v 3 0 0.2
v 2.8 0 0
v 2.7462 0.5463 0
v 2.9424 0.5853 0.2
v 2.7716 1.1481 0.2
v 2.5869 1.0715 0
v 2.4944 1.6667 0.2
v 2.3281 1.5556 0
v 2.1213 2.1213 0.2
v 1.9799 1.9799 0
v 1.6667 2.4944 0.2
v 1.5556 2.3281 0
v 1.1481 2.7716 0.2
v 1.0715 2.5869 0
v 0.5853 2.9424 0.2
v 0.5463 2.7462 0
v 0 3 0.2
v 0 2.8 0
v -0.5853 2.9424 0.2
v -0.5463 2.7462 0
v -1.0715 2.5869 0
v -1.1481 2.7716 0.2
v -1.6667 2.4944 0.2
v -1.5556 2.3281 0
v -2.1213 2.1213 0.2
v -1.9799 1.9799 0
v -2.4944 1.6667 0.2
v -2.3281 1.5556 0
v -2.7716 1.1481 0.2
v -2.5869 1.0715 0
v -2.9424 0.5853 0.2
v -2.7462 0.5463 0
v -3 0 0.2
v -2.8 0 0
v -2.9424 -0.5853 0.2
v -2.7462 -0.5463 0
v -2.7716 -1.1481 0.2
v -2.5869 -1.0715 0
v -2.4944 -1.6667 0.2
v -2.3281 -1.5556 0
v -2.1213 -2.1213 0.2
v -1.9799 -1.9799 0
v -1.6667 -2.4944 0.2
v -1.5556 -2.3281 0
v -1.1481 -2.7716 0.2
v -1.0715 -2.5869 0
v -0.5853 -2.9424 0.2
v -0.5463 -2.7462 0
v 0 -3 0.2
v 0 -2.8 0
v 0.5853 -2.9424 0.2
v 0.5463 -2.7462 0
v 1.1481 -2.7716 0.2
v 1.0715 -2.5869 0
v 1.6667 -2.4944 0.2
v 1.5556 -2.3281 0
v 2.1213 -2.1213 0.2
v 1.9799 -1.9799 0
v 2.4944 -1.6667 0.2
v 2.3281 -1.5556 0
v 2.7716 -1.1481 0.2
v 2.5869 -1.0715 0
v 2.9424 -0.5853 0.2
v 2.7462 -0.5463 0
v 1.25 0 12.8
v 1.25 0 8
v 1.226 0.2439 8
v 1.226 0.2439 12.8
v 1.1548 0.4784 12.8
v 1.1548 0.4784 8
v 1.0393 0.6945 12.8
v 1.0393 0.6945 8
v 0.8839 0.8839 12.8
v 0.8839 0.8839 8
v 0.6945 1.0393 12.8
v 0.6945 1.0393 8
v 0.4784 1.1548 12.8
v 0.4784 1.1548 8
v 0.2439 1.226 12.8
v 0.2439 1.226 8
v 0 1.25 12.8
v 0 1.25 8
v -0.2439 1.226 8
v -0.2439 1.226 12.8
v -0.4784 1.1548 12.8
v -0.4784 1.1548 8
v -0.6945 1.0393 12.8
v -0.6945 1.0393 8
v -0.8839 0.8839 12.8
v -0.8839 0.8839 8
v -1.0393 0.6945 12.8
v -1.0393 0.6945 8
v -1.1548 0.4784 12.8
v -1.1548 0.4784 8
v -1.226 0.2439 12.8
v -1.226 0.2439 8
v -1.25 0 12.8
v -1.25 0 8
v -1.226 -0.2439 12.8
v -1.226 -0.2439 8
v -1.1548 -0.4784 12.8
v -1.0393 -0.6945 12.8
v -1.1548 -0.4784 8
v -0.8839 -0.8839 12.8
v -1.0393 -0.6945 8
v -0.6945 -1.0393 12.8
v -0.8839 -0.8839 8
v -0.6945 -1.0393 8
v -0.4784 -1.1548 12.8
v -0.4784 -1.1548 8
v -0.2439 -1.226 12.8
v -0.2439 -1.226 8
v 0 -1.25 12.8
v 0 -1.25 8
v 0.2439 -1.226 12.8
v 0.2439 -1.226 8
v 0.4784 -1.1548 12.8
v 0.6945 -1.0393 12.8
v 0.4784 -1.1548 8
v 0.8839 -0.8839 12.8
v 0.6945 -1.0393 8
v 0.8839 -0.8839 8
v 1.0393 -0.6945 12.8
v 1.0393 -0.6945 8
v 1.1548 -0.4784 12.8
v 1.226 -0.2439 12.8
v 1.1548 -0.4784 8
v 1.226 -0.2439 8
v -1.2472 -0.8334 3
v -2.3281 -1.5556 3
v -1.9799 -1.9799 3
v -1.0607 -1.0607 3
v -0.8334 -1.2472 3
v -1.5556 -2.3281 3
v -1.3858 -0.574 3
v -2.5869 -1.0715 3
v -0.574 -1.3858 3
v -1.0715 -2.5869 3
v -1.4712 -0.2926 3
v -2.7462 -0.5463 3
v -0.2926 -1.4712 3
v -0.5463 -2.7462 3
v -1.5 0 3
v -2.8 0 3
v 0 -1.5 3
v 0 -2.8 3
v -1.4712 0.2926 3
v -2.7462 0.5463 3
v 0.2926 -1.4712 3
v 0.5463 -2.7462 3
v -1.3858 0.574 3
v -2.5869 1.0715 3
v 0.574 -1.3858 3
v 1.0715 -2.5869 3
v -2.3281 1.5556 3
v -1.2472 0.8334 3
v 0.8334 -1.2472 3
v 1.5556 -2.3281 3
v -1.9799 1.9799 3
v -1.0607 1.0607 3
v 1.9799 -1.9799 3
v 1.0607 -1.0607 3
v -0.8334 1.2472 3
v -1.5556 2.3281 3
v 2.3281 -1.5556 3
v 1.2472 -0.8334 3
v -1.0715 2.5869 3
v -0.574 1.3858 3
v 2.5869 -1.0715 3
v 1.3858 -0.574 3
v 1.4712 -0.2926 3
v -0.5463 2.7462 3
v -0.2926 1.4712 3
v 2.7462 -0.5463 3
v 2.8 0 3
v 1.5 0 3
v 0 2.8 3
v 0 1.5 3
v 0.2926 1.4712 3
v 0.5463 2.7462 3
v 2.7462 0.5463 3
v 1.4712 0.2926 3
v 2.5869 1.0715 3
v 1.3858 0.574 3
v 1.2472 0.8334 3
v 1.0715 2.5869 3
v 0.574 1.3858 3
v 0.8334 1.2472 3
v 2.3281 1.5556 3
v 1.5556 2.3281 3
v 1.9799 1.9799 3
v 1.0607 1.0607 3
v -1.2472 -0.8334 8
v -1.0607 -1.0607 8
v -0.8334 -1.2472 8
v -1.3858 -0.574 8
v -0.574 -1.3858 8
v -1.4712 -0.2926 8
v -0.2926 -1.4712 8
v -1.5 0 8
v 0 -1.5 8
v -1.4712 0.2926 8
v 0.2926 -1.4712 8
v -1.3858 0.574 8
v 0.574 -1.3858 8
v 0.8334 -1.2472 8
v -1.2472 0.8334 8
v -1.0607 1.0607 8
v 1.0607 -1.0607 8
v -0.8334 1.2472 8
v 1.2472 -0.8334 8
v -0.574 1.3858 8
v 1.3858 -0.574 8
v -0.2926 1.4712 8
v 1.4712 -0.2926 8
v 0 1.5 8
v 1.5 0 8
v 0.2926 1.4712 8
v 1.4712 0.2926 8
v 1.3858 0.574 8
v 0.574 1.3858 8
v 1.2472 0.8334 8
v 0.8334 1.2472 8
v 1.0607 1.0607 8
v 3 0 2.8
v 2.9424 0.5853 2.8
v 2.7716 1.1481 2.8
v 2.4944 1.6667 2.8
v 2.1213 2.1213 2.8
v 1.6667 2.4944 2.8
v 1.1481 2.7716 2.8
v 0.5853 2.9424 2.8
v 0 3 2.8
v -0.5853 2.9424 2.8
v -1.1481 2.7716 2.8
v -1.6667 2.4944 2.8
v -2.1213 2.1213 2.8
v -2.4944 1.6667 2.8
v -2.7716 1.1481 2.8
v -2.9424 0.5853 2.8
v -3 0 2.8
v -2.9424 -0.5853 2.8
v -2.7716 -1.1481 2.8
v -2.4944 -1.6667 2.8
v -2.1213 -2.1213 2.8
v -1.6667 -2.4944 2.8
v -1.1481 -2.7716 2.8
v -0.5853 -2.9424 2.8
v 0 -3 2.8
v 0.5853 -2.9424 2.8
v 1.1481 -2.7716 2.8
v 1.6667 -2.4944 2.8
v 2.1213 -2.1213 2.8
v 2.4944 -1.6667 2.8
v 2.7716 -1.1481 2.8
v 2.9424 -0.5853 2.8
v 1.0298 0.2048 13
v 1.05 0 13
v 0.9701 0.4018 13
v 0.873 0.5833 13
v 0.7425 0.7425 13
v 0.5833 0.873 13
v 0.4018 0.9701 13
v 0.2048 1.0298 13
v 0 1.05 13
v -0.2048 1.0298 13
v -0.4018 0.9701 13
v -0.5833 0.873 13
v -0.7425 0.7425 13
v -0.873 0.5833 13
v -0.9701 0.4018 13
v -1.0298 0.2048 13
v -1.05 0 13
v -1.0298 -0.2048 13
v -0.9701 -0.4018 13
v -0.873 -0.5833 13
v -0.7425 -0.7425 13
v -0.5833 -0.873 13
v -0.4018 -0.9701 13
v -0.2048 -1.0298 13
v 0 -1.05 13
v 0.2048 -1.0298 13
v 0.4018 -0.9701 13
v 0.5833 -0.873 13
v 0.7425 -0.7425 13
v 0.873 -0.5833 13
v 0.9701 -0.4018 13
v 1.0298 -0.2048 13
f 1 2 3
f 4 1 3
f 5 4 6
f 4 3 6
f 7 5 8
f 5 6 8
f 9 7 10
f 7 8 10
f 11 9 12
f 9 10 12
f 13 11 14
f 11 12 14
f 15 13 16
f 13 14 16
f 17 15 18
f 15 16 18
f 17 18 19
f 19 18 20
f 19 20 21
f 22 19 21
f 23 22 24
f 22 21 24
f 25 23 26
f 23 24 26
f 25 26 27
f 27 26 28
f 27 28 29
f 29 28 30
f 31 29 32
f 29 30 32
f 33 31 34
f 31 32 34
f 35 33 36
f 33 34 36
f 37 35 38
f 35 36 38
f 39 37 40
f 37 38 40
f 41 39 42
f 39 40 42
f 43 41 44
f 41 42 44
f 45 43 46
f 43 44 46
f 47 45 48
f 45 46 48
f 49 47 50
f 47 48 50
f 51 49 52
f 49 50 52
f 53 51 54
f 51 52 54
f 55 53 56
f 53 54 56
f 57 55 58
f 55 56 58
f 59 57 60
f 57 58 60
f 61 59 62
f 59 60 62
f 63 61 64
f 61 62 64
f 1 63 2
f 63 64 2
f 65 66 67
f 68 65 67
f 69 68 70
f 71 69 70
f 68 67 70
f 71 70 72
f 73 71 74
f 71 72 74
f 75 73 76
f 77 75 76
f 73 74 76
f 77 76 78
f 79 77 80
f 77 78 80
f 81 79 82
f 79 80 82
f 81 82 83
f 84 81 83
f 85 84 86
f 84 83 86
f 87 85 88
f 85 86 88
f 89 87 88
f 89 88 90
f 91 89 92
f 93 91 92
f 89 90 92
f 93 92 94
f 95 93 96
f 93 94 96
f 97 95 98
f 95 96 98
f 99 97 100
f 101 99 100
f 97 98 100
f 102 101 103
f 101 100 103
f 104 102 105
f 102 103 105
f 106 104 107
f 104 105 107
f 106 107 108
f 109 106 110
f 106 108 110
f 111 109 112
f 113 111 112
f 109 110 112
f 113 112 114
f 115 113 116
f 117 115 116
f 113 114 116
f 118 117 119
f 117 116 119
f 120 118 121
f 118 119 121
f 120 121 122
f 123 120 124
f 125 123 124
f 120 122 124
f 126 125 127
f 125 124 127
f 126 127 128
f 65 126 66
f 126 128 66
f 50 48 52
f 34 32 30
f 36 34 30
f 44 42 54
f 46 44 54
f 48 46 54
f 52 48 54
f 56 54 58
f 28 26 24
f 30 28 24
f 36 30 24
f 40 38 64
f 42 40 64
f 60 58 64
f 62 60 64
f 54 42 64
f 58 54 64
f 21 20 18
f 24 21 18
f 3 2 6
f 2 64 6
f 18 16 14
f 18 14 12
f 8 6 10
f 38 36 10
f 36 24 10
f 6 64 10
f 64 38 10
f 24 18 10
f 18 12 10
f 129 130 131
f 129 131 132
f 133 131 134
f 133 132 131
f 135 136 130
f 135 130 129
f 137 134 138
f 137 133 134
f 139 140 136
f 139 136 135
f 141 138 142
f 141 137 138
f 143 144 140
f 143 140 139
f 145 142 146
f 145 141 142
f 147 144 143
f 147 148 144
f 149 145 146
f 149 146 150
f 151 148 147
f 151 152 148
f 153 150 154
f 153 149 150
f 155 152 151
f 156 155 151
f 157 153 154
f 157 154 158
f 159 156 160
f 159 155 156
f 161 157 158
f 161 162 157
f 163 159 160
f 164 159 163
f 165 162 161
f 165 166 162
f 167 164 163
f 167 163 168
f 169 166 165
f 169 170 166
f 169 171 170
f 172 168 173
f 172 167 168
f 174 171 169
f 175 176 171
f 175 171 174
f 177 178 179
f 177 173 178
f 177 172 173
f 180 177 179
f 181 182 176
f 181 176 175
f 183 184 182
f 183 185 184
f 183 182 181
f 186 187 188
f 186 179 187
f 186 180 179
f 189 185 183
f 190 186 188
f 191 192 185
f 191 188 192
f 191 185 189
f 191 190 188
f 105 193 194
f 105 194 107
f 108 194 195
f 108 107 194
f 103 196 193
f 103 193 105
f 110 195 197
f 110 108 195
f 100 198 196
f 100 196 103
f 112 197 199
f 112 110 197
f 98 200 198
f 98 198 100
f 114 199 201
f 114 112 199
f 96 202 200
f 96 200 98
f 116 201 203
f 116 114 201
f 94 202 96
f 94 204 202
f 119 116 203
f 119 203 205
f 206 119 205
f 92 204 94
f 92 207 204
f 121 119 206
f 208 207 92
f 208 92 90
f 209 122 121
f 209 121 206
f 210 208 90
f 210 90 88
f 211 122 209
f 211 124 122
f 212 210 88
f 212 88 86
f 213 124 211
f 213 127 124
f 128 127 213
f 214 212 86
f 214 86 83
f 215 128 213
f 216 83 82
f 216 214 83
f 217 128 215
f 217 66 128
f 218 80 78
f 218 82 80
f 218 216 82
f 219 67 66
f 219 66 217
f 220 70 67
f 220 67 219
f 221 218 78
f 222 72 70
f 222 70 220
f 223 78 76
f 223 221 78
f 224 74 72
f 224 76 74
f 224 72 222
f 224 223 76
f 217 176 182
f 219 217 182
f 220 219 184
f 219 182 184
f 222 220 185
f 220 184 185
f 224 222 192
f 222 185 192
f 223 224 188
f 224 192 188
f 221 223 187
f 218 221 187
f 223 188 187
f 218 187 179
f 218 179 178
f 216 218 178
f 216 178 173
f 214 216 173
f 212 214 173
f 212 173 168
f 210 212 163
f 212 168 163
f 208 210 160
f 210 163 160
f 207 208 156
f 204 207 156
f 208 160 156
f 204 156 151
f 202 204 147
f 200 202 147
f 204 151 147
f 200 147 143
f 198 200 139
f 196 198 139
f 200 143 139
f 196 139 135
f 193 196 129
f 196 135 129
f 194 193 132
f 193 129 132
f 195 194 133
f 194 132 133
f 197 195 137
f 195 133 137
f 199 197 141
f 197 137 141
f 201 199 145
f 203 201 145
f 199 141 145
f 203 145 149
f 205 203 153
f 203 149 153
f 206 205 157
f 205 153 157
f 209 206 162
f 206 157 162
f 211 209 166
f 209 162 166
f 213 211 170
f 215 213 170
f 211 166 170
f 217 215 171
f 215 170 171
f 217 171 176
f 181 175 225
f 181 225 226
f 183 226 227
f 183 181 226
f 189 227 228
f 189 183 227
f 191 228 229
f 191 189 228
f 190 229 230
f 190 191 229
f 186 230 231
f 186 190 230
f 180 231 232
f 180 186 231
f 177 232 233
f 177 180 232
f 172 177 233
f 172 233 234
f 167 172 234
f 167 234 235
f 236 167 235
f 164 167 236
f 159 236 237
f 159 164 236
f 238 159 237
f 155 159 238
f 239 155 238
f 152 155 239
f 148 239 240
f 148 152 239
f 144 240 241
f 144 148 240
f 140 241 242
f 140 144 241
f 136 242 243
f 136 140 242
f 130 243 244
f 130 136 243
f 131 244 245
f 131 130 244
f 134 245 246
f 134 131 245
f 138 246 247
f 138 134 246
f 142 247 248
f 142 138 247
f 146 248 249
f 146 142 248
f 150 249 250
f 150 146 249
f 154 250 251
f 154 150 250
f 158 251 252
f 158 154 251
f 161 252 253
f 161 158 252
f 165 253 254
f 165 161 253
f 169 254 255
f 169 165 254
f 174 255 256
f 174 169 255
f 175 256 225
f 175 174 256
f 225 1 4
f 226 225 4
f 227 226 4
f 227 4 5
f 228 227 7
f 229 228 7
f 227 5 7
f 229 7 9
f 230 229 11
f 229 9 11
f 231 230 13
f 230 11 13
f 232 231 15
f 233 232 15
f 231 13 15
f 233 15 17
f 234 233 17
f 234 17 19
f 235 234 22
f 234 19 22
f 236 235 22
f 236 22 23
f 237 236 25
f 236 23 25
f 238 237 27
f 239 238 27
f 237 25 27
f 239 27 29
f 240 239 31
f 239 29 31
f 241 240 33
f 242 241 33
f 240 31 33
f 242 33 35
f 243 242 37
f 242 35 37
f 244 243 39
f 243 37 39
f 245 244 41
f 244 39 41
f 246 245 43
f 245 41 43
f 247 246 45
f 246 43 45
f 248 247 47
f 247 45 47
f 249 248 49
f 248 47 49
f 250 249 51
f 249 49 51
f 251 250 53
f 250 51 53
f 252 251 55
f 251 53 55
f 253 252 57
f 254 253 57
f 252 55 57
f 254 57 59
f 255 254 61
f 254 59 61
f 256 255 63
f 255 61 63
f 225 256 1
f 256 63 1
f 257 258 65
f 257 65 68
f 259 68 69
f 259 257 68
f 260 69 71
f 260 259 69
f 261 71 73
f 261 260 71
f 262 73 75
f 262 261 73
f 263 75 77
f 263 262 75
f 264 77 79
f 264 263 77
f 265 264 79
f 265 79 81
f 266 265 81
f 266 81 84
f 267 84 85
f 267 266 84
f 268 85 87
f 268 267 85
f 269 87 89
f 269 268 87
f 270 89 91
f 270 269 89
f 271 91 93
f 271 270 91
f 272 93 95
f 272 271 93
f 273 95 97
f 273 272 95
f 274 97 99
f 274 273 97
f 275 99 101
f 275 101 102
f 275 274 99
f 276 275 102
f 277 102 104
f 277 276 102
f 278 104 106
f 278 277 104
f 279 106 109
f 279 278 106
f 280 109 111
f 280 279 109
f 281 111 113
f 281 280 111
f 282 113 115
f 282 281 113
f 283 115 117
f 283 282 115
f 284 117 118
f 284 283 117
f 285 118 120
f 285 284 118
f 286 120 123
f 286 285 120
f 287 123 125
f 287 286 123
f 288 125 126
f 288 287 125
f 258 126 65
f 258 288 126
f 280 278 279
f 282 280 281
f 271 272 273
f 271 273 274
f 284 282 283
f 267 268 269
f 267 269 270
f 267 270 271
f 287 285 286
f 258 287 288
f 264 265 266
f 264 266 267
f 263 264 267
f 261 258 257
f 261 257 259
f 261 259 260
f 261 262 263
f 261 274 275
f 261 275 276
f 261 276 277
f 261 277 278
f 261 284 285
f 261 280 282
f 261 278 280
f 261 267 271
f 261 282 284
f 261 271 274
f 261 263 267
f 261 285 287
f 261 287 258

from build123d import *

# Parameters (mm, degrees)
SKETCH_1_R      = 3
EXTRUDE_1_DEPTH = 3
SKETCH_2_R      = 1.5
EXTRUDE_2_DEPTH = 5
SKETCH_3_R      = 1.25
EXTRUDE_3_DEPTH = 5
CHAMFER_1_SIZE  = 0.2


with BuildPart() as part:
    # 草图1 → 凸台-拉伸1 (new body)
    with BuildSketch(Plane.XY):
        Circle(SKETCH_1_R)
    extrude(amount=EXTRUDE_1_DEPTH)

    # 草图2 → 凸台-拉伸2 (add)
    with BuildSketch(Plane.XY.offset(3)):
        Circle(SKETCH_2_R)
    extrude(amount=EXTRUDE_2_DEPTH)

    # 草图3 → 凸台-拉伸3 (add)
    with BuildSketch(Plane.XY.offset(8)):
        Circle(SKETCH_3_R)
    extrude(amount=EXTRUDE_3_DEPTH)

    # 倒角1
    chamfer_1_edges = [part.edges().sort_by_distance(p)[0] for p in [
        (-1.25, 0, 13),
        (-3, 0, 0),
        (-3, 0, 3),
    ]]
    chamfer(chamfer_1_edges, length=CHAMFER_1_SIZE)


solid = part.part
